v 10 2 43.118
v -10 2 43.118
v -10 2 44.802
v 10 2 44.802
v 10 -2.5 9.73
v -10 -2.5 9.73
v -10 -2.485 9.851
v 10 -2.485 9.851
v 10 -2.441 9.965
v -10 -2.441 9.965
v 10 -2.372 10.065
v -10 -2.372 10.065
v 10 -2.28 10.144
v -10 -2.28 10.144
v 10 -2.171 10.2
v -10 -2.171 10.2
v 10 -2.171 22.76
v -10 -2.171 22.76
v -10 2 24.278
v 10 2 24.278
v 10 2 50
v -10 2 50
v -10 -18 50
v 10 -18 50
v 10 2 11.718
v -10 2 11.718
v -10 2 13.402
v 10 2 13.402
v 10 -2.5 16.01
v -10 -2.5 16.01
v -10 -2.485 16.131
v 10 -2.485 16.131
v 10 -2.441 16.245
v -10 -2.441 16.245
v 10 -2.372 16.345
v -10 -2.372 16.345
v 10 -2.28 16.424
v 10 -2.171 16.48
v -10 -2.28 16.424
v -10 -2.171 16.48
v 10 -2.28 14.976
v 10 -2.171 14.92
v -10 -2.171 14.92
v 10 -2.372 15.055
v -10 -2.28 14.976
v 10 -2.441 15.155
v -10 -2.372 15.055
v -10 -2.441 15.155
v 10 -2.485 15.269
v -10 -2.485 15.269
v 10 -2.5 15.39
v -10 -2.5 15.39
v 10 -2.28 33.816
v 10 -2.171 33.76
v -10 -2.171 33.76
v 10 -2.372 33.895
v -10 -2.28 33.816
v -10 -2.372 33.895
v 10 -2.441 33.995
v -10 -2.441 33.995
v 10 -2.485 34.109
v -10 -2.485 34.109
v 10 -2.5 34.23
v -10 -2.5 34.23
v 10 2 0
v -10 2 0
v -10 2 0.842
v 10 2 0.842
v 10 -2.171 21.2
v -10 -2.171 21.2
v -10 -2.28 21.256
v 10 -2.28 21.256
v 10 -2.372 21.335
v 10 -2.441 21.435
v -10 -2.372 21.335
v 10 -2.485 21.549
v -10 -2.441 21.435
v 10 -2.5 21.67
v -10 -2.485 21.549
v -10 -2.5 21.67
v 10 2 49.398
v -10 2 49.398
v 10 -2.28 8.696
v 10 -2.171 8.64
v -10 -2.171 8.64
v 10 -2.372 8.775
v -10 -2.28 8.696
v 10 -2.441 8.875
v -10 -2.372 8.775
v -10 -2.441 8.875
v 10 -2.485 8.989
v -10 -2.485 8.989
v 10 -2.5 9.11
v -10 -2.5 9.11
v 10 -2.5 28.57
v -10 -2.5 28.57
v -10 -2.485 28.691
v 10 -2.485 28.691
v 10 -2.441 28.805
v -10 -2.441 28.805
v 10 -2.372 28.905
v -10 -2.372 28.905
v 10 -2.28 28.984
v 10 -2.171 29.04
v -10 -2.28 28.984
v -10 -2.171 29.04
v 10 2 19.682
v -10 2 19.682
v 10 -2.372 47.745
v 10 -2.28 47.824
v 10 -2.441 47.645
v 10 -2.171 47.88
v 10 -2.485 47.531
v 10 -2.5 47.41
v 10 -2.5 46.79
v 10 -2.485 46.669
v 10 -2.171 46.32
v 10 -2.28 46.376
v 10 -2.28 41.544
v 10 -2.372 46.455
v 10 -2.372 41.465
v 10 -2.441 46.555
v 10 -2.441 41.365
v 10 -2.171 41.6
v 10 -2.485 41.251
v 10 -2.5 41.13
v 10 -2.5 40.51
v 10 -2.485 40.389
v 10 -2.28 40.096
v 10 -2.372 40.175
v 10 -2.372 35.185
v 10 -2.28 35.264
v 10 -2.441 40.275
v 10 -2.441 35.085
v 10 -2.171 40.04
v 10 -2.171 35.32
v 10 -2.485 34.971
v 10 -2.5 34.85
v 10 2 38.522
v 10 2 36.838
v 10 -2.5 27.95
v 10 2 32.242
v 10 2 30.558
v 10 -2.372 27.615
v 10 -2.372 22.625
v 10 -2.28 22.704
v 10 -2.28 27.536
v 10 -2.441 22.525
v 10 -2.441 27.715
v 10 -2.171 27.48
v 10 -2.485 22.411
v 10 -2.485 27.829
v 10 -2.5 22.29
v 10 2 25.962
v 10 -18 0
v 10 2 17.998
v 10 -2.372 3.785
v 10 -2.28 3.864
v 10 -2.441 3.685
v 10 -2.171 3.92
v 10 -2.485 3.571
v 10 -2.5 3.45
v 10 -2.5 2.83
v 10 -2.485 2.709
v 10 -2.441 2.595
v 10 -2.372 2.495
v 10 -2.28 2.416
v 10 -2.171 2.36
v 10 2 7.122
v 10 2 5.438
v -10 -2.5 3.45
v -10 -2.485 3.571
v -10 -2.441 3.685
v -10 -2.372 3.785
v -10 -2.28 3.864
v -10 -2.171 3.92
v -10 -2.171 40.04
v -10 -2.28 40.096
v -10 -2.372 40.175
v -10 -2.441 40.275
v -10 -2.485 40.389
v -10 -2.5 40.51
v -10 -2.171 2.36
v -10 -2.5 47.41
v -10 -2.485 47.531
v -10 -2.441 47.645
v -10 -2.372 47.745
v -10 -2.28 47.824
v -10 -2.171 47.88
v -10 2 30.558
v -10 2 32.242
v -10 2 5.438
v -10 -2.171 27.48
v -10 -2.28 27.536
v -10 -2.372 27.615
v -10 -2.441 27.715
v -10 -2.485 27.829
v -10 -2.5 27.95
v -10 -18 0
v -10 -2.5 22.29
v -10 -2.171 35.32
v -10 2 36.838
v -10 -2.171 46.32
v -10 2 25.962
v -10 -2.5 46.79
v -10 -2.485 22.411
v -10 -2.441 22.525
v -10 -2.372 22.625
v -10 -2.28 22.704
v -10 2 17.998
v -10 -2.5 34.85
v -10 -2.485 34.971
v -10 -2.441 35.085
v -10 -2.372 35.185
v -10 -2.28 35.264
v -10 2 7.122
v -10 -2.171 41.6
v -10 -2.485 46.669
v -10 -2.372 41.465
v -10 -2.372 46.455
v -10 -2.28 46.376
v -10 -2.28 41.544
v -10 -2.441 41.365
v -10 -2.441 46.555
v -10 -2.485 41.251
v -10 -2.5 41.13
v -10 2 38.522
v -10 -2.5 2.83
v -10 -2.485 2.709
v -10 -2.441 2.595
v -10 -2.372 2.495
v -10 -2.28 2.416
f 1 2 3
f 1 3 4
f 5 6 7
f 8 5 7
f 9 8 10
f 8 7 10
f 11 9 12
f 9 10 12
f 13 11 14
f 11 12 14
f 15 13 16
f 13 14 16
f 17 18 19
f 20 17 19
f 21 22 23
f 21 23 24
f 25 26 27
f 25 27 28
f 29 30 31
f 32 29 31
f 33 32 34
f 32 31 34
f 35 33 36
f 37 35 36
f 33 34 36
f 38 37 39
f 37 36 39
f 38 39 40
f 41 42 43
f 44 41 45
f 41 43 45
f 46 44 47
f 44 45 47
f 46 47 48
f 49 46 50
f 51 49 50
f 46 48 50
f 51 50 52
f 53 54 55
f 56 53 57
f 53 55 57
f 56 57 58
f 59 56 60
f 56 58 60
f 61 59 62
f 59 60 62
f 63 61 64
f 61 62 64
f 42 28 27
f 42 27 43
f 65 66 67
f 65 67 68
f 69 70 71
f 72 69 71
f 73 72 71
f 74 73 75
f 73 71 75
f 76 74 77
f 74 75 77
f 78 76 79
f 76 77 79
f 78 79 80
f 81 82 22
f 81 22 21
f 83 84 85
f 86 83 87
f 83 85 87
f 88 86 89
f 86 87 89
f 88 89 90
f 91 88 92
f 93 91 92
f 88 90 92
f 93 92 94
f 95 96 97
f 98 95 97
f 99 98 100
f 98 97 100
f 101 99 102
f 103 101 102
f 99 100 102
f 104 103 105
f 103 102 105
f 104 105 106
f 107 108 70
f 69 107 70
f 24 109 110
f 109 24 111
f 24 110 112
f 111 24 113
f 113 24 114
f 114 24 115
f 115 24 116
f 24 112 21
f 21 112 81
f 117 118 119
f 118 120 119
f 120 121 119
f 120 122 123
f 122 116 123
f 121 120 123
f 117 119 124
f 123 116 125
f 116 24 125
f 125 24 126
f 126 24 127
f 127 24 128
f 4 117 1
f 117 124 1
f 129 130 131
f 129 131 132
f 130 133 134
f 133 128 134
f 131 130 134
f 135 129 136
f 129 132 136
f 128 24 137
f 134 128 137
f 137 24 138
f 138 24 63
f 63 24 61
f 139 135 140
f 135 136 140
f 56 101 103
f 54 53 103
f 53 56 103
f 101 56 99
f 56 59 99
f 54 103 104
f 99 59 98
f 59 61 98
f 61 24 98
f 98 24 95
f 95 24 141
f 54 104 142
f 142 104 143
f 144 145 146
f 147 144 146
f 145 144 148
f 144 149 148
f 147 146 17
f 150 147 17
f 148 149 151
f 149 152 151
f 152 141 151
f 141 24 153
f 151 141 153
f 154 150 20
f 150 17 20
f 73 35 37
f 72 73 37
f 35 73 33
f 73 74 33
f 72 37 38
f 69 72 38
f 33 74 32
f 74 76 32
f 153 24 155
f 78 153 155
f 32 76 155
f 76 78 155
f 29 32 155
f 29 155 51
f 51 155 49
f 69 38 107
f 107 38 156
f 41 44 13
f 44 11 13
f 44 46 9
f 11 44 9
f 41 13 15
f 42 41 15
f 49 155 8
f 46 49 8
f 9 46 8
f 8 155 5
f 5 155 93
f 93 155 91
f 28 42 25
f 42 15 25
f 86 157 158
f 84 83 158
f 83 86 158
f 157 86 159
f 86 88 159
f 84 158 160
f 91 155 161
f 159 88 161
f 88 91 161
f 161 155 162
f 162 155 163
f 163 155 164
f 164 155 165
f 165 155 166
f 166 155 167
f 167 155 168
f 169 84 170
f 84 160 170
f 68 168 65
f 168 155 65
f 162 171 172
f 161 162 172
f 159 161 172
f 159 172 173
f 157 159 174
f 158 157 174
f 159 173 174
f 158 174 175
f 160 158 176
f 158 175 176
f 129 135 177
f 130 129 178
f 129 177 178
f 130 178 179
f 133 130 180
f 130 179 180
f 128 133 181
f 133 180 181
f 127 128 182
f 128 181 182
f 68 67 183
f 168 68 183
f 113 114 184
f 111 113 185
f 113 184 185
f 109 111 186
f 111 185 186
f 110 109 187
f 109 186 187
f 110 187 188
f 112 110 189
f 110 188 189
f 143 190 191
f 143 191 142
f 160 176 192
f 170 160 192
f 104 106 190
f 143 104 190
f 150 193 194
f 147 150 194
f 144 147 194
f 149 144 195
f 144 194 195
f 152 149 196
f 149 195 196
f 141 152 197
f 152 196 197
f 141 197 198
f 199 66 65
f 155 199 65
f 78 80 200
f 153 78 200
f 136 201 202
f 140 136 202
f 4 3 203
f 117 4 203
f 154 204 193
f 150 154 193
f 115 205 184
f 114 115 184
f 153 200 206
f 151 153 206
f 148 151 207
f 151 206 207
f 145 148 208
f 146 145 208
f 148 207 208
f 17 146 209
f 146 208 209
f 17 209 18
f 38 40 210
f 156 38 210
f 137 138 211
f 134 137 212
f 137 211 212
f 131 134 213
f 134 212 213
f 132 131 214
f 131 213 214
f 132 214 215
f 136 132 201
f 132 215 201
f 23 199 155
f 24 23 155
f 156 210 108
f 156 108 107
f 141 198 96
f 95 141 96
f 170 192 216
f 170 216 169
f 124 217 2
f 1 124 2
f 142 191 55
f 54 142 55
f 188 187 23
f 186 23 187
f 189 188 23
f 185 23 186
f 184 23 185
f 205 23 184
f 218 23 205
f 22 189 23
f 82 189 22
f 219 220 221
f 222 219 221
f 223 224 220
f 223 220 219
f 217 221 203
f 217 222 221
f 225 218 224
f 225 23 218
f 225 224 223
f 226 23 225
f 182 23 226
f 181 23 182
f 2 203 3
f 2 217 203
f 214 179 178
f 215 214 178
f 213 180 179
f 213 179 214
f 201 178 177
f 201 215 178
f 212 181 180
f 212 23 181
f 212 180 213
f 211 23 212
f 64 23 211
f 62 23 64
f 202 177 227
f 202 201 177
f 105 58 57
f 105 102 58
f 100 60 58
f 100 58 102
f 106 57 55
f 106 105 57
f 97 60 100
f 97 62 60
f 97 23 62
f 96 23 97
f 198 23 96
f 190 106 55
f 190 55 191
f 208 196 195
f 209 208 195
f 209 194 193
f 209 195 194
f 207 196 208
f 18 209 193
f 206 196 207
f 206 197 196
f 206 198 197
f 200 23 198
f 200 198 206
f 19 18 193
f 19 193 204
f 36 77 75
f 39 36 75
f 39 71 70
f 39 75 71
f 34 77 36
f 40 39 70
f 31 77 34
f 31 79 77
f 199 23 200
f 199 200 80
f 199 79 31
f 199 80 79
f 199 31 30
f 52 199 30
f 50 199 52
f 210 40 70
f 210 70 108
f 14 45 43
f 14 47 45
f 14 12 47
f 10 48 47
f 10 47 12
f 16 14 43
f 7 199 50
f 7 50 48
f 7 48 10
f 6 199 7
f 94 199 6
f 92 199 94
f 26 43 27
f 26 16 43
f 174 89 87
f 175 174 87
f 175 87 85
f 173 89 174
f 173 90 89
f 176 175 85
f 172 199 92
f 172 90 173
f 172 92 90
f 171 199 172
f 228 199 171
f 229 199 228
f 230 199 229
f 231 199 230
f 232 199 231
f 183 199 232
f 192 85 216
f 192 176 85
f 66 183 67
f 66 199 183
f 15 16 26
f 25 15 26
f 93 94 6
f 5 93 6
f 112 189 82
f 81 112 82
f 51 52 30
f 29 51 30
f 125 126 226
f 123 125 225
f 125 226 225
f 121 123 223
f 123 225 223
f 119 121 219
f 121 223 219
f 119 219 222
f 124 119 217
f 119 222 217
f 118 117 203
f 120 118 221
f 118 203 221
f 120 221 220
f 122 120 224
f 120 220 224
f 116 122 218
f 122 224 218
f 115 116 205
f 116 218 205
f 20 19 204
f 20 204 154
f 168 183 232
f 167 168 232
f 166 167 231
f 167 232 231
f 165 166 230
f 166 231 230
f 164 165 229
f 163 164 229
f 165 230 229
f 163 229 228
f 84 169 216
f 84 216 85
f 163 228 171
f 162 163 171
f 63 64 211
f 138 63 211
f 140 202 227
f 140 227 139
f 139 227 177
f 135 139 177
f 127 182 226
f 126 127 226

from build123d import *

# Parameters (mm, degrees)
SKETCH_1_W             = 20
SKETCH_1_H             = 20
EXTRUDE_1_DEPTH        = 50
CUT_EXTRUDE_1_DEPTH    = 57.780278266
PATTERN_LINEAR_1_COUNT = 8
PATTERN_LINEAR_1_PITCH = 6.28


with BuildPart() as part:
    # 草图1 → 凸台-拉伸1 (new body)
    with BuildSketch(Plane.XY):
        with Locations((0, -8)):
            Rectangle(SKETCH_1_W, SKETCH_1_H)
    extrude(amount=EXTRUDE_1_DEPTH)

    # 草图2 → 切除-拉伸1 (cut, through all)
    with BuildSketch(Plane.ZY.offset(10)):
        with BuildLine():
            Line((0.842059531, 2), (2.360183044, -2.171010072))
            ThreePointArc((2.360183044, -2.171010072), (2.543241137, -2.409576022), (2.830029355, -2.5))
            Line((2.830029355, -2.5), (3.449970645, -2.5))
            ThreePointArc((3.449970645, -2.5), (3.736758863, -2.409576022), (3.919816956, -2.171010072))
            Line((3.919816956, -2.171010072), (5.437940469, 2))
            Line((5.437940469, 2), (0.842059531, 2))
        make_face()
    cut_extrude_1 = extrude(amount=-CUT_EXTRUDE_1_DEPTH, mode=Mode.SUBTRACT)

    # 阵列(线性)1: 切除-拉伸1 ×8
    with Locations(*[(0, 0, i * PATTERN_LINEAR_1_PITCH) for i in range(1, PATTERN_LINEAR_1_COUNT)]):
        add(cut_extrude_1, mode=Mode.SUBTRACT)


solid = part.part
